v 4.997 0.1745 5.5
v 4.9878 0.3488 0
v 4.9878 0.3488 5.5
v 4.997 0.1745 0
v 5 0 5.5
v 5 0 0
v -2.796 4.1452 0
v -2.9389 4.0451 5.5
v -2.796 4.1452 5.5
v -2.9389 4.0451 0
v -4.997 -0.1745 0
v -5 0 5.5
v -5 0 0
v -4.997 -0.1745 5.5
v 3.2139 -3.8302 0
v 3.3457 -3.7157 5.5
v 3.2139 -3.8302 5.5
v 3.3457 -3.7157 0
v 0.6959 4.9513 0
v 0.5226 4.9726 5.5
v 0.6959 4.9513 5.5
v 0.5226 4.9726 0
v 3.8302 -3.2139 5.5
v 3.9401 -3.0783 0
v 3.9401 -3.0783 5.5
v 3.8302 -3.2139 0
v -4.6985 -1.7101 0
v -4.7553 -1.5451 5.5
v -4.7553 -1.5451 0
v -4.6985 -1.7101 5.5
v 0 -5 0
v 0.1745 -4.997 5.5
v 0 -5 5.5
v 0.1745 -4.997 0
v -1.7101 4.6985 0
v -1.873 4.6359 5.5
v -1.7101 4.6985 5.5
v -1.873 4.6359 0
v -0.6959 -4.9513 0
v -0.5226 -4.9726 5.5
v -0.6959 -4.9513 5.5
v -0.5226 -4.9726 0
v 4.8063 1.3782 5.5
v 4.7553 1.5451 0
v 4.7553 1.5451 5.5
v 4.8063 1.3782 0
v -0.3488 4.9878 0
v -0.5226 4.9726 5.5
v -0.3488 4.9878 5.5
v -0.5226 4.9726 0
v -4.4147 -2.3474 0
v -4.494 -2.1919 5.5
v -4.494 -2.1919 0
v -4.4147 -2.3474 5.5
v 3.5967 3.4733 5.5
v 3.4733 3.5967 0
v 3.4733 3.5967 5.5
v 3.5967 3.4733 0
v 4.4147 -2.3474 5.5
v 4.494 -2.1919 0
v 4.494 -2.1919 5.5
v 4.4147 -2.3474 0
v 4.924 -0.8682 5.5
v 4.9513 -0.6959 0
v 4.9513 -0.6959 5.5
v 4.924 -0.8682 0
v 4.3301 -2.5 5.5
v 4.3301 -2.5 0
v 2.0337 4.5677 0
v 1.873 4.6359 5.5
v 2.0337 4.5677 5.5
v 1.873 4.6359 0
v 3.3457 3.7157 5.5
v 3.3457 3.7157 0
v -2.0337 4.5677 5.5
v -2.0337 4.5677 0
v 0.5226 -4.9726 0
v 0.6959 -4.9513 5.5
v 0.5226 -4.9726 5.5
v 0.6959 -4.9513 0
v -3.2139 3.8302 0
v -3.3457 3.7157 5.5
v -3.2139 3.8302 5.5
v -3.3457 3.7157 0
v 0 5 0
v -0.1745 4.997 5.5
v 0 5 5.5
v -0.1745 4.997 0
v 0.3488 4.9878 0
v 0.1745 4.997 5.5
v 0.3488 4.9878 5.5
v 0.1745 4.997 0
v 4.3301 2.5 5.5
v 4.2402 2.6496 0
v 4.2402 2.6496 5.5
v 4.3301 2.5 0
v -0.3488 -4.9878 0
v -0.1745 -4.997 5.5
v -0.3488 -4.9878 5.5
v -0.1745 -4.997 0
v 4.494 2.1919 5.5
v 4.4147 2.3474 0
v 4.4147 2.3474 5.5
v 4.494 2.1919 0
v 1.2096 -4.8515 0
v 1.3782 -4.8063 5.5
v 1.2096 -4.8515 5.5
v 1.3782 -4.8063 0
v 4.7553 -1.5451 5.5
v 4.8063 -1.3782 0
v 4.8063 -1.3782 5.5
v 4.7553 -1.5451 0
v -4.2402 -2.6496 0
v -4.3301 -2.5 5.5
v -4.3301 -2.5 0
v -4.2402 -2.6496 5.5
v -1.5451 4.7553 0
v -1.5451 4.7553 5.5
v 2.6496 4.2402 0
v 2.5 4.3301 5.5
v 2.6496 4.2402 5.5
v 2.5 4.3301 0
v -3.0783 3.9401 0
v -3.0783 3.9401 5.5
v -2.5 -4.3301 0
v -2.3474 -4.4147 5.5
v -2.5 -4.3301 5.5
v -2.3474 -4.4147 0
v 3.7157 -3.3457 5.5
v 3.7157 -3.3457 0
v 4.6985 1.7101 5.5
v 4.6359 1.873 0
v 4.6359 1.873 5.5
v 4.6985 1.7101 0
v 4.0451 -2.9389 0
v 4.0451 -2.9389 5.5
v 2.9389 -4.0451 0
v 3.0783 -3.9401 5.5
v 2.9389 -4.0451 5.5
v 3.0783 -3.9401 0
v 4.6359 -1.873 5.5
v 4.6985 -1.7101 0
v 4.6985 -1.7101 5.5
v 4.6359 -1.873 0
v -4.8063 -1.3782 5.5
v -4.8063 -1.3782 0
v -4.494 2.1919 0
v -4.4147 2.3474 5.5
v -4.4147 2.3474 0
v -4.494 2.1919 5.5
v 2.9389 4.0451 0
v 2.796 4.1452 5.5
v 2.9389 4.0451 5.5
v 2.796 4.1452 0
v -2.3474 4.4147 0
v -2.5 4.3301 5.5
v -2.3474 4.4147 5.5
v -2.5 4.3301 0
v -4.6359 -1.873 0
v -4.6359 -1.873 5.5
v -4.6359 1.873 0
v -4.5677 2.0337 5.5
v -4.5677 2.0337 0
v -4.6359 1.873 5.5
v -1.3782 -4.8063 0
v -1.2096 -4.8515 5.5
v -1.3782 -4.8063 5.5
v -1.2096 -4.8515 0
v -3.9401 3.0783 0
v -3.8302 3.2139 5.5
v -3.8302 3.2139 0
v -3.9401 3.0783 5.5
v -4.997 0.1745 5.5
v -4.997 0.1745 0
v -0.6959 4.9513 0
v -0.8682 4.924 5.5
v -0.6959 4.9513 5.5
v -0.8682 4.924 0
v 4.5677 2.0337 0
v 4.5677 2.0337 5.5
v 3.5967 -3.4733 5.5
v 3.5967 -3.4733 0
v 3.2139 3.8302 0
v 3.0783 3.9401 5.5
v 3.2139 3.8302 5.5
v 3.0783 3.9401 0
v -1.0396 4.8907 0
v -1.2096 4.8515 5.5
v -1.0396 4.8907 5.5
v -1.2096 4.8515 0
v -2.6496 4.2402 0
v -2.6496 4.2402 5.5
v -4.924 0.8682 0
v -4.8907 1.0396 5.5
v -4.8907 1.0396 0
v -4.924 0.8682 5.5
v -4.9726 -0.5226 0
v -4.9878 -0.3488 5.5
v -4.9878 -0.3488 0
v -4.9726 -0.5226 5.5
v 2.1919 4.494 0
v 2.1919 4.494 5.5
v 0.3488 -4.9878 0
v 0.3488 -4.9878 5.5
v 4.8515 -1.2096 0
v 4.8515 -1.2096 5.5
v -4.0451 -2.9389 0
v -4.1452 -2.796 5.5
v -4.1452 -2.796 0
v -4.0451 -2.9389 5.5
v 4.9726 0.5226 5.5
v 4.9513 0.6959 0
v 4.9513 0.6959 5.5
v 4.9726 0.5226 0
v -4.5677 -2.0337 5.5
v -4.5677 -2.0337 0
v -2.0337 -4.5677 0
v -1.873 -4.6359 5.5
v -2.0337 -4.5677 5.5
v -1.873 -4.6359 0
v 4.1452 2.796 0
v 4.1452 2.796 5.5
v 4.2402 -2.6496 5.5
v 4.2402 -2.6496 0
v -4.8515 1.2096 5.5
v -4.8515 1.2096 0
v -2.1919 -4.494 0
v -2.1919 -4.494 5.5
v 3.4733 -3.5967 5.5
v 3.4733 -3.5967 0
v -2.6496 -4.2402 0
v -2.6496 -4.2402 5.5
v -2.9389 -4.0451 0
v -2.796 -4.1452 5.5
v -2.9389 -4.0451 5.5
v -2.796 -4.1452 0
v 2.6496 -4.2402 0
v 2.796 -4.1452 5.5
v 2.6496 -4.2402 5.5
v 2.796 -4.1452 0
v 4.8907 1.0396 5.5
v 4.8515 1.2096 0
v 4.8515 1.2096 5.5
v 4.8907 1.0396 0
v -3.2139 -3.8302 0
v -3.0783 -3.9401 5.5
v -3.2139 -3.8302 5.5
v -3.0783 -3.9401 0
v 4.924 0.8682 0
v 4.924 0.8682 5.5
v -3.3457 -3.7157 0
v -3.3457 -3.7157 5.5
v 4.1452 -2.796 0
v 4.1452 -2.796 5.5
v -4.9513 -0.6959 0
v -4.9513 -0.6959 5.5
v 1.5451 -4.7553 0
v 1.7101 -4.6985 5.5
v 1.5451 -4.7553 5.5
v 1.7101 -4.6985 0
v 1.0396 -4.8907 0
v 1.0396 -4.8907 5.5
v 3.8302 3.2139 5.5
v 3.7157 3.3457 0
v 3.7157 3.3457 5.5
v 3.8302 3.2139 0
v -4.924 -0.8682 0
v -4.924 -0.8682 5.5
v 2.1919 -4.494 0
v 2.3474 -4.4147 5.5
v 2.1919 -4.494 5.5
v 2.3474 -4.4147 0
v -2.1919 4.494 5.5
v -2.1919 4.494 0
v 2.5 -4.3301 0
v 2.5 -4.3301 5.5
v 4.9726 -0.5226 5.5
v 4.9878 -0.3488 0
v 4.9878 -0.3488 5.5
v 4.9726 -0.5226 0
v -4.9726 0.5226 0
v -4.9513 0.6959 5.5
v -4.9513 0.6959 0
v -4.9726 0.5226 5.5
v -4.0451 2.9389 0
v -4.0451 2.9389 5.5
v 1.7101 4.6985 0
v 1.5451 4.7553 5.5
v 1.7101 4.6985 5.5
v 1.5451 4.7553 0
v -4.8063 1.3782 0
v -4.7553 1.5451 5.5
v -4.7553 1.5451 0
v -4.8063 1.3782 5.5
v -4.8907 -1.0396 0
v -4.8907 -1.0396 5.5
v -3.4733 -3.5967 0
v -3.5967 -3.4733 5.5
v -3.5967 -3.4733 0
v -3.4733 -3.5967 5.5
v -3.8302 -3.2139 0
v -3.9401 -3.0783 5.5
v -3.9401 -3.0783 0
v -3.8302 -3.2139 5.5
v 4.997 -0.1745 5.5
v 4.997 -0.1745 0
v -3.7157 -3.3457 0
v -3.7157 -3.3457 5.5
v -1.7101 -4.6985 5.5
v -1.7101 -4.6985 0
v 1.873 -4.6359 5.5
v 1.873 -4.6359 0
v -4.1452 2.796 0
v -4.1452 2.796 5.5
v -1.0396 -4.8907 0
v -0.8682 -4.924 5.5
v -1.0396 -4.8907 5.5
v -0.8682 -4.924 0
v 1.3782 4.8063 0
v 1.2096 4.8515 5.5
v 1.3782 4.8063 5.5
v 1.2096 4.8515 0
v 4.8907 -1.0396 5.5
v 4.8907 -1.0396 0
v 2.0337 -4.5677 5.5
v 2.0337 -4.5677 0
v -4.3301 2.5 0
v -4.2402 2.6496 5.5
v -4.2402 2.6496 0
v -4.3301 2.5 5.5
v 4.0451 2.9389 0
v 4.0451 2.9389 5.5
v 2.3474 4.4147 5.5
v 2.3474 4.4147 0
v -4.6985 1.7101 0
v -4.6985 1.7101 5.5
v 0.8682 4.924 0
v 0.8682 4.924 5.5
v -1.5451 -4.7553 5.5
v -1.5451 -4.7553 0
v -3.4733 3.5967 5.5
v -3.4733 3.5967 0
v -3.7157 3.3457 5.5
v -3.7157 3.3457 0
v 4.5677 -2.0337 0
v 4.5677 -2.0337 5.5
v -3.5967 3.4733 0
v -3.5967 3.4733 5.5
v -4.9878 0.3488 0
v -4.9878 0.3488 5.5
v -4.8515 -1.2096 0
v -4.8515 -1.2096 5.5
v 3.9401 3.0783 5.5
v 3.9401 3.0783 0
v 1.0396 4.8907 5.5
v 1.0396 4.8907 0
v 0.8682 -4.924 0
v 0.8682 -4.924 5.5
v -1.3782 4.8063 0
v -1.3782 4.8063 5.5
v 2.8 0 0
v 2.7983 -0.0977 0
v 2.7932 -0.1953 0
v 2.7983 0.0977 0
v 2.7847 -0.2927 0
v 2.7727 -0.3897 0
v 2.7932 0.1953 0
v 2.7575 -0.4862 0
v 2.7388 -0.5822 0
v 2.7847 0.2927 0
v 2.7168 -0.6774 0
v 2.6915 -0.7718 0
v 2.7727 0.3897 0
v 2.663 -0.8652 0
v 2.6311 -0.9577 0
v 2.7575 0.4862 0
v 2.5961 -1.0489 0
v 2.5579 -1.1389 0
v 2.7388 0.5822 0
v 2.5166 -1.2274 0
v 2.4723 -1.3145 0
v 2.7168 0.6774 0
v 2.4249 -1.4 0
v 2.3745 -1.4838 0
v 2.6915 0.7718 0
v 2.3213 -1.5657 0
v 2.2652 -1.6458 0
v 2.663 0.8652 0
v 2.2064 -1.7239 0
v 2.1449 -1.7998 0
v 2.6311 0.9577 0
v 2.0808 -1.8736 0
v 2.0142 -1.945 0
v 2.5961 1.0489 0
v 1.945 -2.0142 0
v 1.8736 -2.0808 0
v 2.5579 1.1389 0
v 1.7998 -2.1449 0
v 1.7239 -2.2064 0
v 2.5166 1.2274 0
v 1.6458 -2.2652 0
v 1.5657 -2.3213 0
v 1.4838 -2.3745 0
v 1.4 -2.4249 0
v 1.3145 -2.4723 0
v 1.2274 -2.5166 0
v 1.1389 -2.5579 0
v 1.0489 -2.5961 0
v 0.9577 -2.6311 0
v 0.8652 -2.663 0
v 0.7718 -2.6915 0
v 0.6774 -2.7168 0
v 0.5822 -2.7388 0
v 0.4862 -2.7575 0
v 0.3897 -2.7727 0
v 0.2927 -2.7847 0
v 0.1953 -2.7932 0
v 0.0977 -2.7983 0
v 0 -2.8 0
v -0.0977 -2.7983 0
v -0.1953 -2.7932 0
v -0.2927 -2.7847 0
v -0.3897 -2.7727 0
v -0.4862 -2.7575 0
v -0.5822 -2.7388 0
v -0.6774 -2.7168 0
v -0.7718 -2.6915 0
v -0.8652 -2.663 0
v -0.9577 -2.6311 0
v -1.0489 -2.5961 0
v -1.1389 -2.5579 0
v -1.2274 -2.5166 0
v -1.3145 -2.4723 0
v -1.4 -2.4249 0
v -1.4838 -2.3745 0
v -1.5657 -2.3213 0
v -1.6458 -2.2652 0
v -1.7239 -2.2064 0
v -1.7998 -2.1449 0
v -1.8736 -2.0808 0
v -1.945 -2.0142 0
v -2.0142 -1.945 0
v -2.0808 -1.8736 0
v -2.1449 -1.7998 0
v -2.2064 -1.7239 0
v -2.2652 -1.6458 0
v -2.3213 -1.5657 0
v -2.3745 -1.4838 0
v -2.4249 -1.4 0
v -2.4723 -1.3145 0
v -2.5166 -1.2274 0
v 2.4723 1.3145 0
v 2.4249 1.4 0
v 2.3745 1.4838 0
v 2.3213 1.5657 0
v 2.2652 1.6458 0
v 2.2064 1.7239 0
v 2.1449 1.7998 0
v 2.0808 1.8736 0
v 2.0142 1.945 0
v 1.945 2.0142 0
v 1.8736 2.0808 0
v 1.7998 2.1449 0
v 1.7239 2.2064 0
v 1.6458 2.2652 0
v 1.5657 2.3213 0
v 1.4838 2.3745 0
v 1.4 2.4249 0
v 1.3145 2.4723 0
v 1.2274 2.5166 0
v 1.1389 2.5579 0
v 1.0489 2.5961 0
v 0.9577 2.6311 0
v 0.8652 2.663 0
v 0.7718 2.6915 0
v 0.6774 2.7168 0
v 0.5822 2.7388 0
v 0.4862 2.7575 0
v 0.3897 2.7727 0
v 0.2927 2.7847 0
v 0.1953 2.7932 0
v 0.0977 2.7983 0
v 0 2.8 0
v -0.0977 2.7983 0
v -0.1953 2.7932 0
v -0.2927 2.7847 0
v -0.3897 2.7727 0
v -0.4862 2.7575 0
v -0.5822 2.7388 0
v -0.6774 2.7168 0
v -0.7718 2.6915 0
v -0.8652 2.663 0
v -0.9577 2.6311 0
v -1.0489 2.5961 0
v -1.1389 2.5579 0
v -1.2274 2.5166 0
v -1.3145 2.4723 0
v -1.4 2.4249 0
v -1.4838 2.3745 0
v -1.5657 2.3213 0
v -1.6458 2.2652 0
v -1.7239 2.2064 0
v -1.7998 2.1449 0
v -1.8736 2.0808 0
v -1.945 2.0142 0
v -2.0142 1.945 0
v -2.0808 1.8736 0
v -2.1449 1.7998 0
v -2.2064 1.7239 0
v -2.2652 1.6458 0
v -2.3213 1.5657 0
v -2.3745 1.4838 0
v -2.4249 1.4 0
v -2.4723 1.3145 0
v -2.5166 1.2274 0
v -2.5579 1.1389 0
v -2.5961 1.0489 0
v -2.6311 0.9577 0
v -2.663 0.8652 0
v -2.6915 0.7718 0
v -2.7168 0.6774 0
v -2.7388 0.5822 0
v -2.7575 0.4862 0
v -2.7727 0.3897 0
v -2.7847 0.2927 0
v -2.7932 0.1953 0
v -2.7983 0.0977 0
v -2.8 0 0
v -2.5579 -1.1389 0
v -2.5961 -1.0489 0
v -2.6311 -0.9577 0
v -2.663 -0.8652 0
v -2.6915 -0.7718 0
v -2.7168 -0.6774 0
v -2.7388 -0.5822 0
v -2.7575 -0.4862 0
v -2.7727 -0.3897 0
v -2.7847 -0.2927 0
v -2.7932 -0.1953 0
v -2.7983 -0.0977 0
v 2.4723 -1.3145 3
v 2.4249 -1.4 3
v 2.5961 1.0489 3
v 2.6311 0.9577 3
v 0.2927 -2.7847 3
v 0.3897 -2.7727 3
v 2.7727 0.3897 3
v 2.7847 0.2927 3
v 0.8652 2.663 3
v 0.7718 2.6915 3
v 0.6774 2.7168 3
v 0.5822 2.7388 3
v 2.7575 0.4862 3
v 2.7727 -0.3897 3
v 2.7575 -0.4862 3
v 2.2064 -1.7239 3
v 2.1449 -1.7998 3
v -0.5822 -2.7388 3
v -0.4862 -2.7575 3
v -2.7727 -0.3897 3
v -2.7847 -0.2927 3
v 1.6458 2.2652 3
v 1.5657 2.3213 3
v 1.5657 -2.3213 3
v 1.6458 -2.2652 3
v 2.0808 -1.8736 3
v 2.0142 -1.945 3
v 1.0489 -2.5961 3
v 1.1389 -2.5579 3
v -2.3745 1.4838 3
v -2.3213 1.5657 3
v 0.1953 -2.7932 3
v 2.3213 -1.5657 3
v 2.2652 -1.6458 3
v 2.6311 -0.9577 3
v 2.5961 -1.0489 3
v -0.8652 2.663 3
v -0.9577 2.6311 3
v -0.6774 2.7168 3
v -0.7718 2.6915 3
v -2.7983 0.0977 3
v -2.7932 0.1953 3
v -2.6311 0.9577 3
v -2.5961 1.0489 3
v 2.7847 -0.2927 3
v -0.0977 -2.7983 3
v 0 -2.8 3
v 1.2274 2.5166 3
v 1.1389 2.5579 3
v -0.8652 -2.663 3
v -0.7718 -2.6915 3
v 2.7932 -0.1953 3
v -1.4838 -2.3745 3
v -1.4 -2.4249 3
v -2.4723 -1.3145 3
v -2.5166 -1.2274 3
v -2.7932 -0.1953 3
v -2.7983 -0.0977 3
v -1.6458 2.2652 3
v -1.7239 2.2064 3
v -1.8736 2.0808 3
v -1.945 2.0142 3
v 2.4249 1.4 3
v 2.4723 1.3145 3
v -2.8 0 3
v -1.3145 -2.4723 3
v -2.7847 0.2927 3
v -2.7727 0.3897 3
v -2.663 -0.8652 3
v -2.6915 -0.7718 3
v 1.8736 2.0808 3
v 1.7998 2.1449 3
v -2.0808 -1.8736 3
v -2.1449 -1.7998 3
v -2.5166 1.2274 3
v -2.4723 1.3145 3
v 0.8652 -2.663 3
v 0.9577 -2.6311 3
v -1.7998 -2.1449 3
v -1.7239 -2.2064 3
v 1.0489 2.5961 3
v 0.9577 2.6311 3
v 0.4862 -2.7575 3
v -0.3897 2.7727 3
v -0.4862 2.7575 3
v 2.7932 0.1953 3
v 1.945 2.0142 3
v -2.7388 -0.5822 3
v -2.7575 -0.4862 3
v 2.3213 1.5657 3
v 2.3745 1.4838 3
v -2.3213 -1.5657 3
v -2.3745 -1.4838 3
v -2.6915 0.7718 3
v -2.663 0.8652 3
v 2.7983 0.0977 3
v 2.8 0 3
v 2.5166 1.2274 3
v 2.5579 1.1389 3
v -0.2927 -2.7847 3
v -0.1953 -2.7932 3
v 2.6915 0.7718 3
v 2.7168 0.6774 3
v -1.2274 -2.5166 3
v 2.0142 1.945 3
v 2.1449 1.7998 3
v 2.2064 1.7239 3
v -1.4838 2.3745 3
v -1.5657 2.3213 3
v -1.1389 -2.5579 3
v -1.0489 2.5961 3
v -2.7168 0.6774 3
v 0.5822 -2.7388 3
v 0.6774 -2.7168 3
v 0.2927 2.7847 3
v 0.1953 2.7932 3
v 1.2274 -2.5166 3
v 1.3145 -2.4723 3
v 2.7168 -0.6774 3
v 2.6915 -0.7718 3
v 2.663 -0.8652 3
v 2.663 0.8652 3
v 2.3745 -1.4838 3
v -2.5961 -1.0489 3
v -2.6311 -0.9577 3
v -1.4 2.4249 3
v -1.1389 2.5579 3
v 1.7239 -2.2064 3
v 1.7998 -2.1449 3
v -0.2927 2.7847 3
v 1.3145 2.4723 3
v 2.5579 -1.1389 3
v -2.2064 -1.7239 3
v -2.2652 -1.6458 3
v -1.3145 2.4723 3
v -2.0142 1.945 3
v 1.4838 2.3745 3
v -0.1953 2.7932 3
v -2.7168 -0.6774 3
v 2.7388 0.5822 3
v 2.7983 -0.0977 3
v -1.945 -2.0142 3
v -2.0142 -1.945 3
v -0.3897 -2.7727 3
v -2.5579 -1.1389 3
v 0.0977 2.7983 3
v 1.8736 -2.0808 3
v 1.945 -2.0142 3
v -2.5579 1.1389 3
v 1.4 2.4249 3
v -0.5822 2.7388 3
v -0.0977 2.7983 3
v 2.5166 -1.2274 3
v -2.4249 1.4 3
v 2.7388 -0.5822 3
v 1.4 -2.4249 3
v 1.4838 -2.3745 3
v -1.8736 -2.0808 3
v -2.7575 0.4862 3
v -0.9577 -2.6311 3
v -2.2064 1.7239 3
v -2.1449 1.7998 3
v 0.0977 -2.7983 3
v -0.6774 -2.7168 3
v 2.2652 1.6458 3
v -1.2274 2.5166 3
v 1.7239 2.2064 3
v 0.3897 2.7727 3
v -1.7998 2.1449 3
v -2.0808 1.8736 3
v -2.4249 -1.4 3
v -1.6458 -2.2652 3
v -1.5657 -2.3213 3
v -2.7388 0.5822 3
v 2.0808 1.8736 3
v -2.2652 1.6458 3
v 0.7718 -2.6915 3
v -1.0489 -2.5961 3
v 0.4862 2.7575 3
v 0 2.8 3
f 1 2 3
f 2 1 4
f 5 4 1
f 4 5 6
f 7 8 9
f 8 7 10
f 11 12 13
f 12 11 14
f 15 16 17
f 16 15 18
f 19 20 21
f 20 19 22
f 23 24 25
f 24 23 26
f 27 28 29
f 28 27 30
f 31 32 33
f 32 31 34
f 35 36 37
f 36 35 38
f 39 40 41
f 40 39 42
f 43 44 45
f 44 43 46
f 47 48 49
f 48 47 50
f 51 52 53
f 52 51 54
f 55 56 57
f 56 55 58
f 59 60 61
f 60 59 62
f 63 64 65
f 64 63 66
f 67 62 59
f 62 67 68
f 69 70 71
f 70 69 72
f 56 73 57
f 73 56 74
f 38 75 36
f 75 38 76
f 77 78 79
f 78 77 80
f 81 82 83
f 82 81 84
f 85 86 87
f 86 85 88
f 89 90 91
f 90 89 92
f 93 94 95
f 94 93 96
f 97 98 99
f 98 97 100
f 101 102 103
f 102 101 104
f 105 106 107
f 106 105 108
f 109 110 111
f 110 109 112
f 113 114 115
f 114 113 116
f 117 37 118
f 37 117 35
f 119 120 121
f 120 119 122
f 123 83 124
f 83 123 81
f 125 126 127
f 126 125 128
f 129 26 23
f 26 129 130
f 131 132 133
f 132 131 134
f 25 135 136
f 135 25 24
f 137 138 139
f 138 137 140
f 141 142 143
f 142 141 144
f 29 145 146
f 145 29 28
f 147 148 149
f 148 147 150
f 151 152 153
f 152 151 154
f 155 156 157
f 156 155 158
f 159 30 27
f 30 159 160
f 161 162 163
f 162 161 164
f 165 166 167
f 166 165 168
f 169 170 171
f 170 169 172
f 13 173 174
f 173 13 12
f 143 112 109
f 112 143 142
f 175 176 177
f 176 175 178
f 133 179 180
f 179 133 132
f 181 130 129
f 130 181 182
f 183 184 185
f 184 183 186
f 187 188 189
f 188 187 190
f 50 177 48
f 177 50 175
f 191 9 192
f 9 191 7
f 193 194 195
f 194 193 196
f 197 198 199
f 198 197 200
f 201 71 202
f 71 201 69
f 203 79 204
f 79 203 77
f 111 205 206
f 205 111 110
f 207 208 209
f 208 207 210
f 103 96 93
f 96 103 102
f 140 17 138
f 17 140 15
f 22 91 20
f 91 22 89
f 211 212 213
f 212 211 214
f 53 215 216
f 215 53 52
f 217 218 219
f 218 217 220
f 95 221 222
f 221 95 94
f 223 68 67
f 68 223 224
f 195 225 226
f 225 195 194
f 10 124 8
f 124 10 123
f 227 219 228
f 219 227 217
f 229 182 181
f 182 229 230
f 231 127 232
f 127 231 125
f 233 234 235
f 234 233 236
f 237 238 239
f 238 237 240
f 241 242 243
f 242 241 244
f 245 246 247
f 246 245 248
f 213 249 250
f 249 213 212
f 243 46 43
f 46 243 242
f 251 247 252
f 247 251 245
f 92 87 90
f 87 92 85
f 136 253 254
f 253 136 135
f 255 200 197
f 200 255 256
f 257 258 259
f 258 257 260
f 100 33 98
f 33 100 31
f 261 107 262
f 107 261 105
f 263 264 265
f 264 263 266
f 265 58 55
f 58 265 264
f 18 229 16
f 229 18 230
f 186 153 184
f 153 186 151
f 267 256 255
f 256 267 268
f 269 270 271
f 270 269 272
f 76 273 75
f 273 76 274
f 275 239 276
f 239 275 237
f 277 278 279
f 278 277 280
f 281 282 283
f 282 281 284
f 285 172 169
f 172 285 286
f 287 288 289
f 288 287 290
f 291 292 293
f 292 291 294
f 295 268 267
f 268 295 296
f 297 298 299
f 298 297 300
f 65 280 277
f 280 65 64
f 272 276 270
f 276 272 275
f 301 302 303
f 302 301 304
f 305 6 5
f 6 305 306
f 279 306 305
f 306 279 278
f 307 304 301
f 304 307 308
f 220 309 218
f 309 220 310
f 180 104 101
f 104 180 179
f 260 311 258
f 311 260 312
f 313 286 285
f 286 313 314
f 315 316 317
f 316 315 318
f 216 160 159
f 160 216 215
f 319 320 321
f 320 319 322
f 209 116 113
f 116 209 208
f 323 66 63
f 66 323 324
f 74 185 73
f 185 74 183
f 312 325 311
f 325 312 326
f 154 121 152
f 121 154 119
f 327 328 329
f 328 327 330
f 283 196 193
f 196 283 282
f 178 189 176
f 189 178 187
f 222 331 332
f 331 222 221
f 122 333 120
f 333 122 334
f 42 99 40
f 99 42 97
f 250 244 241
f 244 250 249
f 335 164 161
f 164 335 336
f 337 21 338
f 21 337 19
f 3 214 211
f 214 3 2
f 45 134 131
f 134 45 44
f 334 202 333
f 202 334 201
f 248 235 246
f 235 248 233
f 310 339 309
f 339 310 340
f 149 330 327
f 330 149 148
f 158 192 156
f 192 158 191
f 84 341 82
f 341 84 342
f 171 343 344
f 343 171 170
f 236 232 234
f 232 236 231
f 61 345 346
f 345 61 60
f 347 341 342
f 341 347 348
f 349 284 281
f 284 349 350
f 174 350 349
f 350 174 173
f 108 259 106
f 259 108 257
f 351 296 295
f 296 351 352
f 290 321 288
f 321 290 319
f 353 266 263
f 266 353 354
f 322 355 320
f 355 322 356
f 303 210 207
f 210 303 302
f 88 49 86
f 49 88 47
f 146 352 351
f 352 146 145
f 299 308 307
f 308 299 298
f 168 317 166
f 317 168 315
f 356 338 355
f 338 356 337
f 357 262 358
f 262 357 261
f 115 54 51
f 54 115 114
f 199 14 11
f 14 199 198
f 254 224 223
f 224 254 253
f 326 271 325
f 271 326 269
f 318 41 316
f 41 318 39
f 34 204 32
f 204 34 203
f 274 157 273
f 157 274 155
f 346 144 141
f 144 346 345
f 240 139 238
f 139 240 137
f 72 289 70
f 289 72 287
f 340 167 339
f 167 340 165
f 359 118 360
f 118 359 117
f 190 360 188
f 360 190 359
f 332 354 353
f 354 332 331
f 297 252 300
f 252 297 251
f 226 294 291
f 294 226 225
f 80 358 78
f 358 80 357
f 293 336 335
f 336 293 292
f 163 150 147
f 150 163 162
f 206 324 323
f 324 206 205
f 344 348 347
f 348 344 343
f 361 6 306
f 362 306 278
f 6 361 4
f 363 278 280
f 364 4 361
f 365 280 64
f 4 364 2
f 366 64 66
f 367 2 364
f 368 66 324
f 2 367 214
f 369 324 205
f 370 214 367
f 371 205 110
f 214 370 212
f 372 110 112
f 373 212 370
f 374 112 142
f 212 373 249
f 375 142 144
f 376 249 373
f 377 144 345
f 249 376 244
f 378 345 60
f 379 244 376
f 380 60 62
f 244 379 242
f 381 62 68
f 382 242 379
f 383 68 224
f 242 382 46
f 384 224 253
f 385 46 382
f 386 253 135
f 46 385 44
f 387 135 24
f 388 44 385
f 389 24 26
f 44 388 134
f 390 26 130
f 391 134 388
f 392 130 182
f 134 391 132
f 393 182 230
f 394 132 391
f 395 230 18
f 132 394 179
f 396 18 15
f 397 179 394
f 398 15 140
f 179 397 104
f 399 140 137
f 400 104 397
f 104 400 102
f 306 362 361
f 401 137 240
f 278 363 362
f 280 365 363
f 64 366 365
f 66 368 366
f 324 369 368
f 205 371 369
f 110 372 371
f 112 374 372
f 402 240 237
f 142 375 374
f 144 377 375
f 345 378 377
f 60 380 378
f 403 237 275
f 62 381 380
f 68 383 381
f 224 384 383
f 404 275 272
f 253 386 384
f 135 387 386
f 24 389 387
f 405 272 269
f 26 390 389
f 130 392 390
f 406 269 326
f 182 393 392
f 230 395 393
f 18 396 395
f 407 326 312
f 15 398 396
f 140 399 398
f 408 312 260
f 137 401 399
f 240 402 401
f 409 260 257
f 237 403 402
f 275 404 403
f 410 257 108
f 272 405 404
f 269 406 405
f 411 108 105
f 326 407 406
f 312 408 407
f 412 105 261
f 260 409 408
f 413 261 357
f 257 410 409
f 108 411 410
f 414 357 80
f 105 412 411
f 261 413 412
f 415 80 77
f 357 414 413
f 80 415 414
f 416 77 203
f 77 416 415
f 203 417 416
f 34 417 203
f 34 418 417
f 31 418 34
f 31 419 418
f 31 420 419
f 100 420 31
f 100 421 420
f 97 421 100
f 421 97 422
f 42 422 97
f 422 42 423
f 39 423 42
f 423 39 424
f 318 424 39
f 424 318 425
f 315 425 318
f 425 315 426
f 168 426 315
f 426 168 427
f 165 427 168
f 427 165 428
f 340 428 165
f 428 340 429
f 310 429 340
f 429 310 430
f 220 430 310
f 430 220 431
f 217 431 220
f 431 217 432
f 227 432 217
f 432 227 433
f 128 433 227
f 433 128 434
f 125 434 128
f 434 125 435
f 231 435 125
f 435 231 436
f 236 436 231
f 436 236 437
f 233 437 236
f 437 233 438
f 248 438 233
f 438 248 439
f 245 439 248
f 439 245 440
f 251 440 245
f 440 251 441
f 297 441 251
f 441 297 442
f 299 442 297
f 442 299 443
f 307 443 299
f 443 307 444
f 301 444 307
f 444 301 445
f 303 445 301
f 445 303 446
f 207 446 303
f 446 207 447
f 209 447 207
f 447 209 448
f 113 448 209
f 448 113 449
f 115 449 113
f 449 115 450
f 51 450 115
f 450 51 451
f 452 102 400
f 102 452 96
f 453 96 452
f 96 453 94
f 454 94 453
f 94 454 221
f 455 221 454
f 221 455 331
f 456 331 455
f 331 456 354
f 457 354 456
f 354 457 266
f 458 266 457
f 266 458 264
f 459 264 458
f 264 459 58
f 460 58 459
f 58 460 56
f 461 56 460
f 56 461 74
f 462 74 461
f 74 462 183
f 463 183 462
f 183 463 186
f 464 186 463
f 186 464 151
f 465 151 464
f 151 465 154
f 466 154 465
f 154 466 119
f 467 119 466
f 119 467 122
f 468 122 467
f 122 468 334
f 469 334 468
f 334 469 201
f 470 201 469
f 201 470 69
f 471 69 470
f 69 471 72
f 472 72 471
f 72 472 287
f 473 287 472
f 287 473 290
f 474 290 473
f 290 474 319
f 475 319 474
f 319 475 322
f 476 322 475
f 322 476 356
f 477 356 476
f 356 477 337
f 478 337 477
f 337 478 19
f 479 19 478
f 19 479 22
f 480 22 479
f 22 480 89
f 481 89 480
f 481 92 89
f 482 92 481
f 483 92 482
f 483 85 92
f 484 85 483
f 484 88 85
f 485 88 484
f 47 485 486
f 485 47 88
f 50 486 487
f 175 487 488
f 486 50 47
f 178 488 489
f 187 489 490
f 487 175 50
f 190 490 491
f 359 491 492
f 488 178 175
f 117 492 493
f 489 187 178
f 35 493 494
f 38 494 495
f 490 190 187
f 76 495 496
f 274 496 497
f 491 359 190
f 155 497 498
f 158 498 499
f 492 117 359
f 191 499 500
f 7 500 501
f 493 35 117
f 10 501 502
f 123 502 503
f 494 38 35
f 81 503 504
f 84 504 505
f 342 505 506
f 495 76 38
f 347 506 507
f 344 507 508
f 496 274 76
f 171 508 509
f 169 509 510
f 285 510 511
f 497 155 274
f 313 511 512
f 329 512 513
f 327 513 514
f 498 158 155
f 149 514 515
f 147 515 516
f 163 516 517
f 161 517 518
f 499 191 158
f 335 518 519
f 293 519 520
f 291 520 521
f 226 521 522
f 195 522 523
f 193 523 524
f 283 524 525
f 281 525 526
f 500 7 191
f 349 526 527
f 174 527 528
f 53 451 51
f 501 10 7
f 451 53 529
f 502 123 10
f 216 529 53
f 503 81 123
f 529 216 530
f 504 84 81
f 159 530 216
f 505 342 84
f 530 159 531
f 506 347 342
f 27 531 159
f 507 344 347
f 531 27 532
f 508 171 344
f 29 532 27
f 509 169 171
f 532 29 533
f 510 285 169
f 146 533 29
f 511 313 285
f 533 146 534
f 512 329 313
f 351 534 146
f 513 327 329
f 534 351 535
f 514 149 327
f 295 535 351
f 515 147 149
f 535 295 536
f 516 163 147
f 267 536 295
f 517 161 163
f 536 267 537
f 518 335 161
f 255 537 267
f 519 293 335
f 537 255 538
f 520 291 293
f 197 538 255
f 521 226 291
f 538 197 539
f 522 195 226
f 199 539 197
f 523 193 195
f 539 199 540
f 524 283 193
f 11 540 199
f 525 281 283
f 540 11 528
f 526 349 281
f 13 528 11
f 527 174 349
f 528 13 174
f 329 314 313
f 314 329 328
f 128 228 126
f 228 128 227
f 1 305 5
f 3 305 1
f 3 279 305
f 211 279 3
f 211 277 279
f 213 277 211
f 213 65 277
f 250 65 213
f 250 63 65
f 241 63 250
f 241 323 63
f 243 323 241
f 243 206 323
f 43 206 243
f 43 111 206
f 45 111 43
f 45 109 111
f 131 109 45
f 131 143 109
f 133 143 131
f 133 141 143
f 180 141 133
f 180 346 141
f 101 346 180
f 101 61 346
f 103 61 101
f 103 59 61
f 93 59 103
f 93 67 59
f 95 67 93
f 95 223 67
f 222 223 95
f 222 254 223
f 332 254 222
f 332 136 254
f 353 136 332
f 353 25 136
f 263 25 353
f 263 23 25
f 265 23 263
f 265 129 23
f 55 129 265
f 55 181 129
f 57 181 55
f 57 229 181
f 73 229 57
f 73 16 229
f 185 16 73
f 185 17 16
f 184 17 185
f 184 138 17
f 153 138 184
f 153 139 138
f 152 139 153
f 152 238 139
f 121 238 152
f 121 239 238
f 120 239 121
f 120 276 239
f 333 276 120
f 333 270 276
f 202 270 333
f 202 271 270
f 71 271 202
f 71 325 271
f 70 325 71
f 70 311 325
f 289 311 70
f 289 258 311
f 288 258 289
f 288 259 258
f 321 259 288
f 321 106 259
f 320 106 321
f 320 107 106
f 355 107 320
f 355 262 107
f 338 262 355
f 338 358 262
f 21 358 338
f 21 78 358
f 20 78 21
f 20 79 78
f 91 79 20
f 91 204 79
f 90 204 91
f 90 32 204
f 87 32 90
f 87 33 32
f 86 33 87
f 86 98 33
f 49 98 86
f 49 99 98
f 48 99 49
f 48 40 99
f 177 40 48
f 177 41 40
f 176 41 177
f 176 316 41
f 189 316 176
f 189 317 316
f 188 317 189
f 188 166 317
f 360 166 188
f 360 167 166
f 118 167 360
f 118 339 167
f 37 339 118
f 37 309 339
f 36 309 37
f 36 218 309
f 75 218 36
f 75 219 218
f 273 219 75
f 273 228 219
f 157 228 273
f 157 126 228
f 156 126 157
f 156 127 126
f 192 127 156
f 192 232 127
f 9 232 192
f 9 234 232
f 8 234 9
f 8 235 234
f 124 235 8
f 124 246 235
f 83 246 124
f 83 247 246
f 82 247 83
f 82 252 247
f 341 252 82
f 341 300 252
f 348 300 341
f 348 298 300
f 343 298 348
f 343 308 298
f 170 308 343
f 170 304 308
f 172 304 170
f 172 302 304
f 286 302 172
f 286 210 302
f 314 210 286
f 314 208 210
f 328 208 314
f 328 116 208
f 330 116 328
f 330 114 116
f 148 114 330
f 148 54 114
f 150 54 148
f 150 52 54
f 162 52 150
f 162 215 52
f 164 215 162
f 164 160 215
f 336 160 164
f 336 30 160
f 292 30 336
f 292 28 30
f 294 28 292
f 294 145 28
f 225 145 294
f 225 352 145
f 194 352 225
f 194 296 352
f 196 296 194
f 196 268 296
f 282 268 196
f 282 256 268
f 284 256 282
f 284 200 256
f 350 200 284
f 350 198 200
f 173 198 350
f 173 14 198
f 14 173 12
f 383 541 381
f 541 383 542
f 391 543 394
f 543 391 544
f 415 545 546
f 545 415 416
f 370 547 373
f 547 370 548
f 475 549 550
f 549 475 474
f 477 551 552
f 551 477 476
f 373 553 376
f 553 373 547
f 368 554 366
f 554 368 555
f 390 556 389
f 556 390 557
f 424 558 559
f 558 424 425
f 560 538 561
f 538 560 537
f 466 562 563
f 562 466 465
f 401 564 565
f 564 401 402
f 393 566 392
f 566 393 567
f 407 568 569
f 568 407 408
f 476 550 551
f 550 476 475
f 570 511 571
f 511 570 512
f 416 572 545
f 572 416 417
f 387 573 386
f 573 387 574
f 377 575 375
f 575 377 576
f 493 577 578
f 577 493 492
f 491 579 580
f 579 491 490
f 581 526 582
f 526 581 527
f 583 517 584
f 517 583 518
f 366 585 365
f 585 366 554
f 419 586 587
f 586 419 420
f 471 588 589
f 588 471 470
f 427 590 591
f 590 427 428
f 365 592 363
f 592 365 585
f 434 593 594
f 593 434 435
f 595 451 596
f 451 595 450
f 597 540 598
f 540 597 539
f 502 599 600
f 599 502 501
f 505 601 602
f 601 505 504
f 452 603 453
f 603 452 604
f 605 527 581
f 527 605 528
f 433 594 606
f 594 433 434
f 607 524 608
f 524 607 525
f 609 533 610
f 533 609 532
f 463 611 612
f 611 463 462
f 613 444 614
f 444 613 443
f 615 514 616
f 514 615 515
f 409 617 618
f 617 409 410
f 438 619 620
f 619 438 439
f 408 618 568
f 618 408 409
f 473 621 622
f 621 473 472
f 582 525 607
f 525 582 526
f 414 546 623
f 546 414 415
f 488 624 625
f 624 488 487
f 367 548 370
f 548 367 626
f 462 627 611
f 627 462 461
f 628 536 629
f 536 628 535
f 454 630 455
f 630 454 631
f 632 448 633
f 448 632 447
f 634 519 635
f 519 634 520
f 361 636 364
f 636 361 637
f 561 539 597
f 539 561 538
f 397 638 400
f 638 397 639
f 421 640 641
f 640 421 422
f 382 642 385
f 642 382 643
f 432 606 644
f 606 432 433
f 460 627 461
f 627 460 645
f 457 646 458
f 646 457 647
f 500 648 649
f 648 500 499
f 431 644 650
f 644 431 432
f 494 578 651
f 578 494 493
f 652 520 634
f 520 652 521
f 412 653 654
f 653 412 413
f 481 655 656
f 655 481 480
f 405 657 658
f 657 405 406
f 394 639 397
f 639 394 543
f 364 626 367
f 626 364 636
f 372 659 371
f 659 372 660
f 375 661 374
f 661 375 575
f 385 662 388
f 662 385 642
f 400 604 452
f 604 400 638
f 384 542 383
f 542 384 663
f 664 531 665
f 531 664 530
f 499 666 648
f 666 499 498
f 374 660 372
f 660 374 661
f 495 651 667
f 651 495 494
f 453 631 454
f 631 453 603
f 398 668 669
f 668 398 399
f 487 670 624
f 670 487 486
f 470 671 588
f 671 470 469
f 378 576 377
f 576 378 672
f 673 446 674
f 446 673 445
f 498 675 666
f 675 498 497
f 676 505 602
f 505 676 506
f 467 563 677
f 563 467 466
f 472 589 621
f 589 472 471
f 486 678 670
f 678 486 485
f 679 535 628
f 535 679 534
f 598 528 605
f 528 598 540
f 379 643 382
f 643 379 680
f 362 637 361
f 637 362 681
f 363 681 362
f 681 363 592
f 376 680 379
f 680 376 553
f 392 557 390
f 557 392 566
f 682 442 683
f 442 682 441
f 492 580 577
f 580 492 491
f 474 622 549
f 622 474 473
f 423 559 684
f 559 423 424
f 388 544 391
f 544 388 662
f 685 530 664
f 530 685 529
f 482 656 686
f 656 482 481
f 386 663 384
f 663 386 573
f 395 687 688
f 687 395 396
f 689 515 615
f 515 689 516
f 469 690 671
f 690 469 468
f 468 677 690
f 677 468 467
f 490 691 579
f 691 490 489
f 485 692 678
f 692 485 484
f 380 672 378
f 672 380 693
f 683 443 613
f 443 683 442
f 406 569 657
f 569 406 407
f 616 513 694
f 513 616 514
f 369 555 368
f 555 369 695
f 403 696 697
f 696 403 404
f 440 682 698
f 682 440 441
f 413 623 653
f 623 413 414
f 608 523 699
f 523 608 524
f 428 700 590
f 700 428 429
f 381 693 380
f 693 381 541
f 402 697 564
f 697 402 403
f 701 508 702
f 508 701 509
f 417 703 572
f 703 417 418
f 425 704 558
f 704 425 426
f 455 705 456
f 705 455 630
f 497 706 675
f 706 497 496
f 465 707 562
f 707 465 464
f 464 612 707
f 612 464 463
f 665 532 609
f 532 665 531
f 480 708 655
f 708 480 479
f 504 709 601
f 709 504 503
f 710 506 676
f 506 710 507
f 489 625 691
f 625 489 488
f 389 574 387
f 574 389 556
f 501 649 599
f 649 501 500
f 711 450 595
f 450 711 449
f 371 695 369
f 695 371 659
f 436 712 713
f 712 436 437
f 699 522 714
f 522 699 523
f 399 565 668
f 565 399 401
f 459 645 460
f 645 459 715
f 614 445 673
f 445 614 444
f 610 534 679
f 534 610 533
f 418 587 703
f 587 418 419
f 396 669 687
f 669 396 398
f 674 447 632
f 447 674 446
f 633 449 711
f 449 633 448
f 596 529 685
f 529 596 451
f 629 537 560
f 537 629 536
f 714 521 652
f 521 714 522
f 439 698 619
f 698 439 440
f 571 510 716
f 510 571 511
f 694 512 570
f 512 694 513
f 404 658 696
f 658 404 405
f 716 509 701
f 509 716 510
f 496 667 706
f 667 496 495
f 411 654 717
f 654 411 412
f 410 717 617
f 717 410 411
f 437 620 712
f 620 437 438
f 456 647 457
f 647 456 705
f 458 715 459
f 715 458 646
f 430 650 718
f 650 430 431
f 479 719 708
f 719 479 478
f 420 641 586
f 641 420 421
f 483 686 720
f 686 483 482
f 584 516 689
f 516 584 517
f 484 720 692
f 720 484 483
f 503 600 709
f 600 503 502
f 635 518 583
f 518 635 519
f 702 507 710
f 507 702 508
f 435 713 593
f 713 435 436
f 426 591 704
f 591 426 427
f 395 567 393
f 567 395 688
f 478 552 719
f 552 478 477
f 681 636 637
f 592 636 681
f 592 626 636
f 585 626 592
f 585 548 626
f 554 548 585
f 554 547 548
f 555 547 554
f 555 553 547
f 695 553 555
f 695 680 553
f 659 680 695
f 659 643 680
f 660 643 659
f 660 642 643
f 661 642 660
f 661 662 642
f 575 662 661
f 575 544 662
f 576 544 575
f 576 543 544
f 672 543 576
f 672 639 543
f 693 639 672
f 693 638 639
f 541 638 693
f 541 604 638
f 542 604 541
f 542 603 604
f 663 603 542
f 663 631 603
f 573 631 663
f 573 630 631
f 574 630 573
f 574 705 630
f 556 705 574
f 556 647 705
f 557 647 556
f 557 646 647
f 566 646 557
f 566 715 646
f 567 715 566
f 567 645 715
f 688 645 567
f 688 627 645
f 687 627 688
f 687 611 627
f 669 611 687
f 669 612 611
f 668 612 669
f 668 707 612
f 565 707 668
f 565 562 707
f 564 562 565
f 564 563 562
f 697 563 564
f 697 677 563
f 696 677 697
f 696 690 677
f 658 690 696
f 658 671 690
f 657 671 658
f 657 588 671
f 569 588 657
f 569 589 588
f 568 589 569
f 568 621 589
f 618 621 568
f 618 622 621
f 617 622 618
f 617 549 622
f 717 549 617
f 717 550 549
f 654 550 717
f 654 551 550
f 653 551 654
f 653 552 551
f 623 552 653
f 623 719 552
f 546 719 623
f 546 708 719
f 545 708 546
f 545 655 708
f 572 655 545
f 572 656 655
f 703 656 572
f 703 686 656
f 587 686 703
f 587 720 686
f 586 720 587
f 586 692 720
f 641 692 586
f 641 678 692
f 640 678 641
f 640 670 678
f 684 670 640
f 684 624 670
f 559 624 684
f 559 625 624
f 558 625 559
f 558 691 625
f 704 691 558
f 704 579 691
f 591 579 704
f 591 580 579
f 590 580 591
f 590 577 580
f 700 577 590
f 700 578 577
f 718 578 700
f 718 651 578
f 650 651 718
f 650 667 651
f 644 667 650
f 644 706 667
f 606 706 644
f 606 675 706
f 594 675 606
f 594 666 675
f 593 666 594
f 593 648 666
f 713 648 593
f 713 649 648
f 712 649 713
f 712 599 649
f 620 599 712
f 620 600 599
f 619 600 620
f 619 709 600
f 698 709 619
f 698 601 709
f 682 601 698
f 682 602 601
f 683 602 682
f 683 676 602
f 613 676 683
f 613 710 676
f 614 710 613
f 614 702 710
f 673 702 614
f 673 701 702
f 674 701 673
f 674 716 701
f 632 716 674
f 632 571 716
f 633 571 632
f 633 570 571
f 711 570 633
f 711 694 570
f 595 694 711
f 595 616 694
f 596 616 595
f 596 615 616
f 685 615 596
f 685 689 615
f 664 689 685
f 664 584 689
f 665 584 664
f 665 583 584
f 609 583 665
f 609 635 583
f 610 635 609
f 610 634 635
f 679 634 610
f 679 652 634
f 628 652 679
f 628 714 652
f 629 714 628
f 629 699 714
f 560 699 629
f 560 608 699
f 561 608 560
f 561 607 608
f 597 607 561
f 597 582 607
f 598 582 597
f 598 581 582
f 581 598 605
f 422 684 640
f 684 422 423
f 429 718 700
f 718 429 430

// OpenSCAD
$fn=180;

difference() {
	cylinder(h=5.5, d=10);
	cylinder(h=3, d=5.6);
}
